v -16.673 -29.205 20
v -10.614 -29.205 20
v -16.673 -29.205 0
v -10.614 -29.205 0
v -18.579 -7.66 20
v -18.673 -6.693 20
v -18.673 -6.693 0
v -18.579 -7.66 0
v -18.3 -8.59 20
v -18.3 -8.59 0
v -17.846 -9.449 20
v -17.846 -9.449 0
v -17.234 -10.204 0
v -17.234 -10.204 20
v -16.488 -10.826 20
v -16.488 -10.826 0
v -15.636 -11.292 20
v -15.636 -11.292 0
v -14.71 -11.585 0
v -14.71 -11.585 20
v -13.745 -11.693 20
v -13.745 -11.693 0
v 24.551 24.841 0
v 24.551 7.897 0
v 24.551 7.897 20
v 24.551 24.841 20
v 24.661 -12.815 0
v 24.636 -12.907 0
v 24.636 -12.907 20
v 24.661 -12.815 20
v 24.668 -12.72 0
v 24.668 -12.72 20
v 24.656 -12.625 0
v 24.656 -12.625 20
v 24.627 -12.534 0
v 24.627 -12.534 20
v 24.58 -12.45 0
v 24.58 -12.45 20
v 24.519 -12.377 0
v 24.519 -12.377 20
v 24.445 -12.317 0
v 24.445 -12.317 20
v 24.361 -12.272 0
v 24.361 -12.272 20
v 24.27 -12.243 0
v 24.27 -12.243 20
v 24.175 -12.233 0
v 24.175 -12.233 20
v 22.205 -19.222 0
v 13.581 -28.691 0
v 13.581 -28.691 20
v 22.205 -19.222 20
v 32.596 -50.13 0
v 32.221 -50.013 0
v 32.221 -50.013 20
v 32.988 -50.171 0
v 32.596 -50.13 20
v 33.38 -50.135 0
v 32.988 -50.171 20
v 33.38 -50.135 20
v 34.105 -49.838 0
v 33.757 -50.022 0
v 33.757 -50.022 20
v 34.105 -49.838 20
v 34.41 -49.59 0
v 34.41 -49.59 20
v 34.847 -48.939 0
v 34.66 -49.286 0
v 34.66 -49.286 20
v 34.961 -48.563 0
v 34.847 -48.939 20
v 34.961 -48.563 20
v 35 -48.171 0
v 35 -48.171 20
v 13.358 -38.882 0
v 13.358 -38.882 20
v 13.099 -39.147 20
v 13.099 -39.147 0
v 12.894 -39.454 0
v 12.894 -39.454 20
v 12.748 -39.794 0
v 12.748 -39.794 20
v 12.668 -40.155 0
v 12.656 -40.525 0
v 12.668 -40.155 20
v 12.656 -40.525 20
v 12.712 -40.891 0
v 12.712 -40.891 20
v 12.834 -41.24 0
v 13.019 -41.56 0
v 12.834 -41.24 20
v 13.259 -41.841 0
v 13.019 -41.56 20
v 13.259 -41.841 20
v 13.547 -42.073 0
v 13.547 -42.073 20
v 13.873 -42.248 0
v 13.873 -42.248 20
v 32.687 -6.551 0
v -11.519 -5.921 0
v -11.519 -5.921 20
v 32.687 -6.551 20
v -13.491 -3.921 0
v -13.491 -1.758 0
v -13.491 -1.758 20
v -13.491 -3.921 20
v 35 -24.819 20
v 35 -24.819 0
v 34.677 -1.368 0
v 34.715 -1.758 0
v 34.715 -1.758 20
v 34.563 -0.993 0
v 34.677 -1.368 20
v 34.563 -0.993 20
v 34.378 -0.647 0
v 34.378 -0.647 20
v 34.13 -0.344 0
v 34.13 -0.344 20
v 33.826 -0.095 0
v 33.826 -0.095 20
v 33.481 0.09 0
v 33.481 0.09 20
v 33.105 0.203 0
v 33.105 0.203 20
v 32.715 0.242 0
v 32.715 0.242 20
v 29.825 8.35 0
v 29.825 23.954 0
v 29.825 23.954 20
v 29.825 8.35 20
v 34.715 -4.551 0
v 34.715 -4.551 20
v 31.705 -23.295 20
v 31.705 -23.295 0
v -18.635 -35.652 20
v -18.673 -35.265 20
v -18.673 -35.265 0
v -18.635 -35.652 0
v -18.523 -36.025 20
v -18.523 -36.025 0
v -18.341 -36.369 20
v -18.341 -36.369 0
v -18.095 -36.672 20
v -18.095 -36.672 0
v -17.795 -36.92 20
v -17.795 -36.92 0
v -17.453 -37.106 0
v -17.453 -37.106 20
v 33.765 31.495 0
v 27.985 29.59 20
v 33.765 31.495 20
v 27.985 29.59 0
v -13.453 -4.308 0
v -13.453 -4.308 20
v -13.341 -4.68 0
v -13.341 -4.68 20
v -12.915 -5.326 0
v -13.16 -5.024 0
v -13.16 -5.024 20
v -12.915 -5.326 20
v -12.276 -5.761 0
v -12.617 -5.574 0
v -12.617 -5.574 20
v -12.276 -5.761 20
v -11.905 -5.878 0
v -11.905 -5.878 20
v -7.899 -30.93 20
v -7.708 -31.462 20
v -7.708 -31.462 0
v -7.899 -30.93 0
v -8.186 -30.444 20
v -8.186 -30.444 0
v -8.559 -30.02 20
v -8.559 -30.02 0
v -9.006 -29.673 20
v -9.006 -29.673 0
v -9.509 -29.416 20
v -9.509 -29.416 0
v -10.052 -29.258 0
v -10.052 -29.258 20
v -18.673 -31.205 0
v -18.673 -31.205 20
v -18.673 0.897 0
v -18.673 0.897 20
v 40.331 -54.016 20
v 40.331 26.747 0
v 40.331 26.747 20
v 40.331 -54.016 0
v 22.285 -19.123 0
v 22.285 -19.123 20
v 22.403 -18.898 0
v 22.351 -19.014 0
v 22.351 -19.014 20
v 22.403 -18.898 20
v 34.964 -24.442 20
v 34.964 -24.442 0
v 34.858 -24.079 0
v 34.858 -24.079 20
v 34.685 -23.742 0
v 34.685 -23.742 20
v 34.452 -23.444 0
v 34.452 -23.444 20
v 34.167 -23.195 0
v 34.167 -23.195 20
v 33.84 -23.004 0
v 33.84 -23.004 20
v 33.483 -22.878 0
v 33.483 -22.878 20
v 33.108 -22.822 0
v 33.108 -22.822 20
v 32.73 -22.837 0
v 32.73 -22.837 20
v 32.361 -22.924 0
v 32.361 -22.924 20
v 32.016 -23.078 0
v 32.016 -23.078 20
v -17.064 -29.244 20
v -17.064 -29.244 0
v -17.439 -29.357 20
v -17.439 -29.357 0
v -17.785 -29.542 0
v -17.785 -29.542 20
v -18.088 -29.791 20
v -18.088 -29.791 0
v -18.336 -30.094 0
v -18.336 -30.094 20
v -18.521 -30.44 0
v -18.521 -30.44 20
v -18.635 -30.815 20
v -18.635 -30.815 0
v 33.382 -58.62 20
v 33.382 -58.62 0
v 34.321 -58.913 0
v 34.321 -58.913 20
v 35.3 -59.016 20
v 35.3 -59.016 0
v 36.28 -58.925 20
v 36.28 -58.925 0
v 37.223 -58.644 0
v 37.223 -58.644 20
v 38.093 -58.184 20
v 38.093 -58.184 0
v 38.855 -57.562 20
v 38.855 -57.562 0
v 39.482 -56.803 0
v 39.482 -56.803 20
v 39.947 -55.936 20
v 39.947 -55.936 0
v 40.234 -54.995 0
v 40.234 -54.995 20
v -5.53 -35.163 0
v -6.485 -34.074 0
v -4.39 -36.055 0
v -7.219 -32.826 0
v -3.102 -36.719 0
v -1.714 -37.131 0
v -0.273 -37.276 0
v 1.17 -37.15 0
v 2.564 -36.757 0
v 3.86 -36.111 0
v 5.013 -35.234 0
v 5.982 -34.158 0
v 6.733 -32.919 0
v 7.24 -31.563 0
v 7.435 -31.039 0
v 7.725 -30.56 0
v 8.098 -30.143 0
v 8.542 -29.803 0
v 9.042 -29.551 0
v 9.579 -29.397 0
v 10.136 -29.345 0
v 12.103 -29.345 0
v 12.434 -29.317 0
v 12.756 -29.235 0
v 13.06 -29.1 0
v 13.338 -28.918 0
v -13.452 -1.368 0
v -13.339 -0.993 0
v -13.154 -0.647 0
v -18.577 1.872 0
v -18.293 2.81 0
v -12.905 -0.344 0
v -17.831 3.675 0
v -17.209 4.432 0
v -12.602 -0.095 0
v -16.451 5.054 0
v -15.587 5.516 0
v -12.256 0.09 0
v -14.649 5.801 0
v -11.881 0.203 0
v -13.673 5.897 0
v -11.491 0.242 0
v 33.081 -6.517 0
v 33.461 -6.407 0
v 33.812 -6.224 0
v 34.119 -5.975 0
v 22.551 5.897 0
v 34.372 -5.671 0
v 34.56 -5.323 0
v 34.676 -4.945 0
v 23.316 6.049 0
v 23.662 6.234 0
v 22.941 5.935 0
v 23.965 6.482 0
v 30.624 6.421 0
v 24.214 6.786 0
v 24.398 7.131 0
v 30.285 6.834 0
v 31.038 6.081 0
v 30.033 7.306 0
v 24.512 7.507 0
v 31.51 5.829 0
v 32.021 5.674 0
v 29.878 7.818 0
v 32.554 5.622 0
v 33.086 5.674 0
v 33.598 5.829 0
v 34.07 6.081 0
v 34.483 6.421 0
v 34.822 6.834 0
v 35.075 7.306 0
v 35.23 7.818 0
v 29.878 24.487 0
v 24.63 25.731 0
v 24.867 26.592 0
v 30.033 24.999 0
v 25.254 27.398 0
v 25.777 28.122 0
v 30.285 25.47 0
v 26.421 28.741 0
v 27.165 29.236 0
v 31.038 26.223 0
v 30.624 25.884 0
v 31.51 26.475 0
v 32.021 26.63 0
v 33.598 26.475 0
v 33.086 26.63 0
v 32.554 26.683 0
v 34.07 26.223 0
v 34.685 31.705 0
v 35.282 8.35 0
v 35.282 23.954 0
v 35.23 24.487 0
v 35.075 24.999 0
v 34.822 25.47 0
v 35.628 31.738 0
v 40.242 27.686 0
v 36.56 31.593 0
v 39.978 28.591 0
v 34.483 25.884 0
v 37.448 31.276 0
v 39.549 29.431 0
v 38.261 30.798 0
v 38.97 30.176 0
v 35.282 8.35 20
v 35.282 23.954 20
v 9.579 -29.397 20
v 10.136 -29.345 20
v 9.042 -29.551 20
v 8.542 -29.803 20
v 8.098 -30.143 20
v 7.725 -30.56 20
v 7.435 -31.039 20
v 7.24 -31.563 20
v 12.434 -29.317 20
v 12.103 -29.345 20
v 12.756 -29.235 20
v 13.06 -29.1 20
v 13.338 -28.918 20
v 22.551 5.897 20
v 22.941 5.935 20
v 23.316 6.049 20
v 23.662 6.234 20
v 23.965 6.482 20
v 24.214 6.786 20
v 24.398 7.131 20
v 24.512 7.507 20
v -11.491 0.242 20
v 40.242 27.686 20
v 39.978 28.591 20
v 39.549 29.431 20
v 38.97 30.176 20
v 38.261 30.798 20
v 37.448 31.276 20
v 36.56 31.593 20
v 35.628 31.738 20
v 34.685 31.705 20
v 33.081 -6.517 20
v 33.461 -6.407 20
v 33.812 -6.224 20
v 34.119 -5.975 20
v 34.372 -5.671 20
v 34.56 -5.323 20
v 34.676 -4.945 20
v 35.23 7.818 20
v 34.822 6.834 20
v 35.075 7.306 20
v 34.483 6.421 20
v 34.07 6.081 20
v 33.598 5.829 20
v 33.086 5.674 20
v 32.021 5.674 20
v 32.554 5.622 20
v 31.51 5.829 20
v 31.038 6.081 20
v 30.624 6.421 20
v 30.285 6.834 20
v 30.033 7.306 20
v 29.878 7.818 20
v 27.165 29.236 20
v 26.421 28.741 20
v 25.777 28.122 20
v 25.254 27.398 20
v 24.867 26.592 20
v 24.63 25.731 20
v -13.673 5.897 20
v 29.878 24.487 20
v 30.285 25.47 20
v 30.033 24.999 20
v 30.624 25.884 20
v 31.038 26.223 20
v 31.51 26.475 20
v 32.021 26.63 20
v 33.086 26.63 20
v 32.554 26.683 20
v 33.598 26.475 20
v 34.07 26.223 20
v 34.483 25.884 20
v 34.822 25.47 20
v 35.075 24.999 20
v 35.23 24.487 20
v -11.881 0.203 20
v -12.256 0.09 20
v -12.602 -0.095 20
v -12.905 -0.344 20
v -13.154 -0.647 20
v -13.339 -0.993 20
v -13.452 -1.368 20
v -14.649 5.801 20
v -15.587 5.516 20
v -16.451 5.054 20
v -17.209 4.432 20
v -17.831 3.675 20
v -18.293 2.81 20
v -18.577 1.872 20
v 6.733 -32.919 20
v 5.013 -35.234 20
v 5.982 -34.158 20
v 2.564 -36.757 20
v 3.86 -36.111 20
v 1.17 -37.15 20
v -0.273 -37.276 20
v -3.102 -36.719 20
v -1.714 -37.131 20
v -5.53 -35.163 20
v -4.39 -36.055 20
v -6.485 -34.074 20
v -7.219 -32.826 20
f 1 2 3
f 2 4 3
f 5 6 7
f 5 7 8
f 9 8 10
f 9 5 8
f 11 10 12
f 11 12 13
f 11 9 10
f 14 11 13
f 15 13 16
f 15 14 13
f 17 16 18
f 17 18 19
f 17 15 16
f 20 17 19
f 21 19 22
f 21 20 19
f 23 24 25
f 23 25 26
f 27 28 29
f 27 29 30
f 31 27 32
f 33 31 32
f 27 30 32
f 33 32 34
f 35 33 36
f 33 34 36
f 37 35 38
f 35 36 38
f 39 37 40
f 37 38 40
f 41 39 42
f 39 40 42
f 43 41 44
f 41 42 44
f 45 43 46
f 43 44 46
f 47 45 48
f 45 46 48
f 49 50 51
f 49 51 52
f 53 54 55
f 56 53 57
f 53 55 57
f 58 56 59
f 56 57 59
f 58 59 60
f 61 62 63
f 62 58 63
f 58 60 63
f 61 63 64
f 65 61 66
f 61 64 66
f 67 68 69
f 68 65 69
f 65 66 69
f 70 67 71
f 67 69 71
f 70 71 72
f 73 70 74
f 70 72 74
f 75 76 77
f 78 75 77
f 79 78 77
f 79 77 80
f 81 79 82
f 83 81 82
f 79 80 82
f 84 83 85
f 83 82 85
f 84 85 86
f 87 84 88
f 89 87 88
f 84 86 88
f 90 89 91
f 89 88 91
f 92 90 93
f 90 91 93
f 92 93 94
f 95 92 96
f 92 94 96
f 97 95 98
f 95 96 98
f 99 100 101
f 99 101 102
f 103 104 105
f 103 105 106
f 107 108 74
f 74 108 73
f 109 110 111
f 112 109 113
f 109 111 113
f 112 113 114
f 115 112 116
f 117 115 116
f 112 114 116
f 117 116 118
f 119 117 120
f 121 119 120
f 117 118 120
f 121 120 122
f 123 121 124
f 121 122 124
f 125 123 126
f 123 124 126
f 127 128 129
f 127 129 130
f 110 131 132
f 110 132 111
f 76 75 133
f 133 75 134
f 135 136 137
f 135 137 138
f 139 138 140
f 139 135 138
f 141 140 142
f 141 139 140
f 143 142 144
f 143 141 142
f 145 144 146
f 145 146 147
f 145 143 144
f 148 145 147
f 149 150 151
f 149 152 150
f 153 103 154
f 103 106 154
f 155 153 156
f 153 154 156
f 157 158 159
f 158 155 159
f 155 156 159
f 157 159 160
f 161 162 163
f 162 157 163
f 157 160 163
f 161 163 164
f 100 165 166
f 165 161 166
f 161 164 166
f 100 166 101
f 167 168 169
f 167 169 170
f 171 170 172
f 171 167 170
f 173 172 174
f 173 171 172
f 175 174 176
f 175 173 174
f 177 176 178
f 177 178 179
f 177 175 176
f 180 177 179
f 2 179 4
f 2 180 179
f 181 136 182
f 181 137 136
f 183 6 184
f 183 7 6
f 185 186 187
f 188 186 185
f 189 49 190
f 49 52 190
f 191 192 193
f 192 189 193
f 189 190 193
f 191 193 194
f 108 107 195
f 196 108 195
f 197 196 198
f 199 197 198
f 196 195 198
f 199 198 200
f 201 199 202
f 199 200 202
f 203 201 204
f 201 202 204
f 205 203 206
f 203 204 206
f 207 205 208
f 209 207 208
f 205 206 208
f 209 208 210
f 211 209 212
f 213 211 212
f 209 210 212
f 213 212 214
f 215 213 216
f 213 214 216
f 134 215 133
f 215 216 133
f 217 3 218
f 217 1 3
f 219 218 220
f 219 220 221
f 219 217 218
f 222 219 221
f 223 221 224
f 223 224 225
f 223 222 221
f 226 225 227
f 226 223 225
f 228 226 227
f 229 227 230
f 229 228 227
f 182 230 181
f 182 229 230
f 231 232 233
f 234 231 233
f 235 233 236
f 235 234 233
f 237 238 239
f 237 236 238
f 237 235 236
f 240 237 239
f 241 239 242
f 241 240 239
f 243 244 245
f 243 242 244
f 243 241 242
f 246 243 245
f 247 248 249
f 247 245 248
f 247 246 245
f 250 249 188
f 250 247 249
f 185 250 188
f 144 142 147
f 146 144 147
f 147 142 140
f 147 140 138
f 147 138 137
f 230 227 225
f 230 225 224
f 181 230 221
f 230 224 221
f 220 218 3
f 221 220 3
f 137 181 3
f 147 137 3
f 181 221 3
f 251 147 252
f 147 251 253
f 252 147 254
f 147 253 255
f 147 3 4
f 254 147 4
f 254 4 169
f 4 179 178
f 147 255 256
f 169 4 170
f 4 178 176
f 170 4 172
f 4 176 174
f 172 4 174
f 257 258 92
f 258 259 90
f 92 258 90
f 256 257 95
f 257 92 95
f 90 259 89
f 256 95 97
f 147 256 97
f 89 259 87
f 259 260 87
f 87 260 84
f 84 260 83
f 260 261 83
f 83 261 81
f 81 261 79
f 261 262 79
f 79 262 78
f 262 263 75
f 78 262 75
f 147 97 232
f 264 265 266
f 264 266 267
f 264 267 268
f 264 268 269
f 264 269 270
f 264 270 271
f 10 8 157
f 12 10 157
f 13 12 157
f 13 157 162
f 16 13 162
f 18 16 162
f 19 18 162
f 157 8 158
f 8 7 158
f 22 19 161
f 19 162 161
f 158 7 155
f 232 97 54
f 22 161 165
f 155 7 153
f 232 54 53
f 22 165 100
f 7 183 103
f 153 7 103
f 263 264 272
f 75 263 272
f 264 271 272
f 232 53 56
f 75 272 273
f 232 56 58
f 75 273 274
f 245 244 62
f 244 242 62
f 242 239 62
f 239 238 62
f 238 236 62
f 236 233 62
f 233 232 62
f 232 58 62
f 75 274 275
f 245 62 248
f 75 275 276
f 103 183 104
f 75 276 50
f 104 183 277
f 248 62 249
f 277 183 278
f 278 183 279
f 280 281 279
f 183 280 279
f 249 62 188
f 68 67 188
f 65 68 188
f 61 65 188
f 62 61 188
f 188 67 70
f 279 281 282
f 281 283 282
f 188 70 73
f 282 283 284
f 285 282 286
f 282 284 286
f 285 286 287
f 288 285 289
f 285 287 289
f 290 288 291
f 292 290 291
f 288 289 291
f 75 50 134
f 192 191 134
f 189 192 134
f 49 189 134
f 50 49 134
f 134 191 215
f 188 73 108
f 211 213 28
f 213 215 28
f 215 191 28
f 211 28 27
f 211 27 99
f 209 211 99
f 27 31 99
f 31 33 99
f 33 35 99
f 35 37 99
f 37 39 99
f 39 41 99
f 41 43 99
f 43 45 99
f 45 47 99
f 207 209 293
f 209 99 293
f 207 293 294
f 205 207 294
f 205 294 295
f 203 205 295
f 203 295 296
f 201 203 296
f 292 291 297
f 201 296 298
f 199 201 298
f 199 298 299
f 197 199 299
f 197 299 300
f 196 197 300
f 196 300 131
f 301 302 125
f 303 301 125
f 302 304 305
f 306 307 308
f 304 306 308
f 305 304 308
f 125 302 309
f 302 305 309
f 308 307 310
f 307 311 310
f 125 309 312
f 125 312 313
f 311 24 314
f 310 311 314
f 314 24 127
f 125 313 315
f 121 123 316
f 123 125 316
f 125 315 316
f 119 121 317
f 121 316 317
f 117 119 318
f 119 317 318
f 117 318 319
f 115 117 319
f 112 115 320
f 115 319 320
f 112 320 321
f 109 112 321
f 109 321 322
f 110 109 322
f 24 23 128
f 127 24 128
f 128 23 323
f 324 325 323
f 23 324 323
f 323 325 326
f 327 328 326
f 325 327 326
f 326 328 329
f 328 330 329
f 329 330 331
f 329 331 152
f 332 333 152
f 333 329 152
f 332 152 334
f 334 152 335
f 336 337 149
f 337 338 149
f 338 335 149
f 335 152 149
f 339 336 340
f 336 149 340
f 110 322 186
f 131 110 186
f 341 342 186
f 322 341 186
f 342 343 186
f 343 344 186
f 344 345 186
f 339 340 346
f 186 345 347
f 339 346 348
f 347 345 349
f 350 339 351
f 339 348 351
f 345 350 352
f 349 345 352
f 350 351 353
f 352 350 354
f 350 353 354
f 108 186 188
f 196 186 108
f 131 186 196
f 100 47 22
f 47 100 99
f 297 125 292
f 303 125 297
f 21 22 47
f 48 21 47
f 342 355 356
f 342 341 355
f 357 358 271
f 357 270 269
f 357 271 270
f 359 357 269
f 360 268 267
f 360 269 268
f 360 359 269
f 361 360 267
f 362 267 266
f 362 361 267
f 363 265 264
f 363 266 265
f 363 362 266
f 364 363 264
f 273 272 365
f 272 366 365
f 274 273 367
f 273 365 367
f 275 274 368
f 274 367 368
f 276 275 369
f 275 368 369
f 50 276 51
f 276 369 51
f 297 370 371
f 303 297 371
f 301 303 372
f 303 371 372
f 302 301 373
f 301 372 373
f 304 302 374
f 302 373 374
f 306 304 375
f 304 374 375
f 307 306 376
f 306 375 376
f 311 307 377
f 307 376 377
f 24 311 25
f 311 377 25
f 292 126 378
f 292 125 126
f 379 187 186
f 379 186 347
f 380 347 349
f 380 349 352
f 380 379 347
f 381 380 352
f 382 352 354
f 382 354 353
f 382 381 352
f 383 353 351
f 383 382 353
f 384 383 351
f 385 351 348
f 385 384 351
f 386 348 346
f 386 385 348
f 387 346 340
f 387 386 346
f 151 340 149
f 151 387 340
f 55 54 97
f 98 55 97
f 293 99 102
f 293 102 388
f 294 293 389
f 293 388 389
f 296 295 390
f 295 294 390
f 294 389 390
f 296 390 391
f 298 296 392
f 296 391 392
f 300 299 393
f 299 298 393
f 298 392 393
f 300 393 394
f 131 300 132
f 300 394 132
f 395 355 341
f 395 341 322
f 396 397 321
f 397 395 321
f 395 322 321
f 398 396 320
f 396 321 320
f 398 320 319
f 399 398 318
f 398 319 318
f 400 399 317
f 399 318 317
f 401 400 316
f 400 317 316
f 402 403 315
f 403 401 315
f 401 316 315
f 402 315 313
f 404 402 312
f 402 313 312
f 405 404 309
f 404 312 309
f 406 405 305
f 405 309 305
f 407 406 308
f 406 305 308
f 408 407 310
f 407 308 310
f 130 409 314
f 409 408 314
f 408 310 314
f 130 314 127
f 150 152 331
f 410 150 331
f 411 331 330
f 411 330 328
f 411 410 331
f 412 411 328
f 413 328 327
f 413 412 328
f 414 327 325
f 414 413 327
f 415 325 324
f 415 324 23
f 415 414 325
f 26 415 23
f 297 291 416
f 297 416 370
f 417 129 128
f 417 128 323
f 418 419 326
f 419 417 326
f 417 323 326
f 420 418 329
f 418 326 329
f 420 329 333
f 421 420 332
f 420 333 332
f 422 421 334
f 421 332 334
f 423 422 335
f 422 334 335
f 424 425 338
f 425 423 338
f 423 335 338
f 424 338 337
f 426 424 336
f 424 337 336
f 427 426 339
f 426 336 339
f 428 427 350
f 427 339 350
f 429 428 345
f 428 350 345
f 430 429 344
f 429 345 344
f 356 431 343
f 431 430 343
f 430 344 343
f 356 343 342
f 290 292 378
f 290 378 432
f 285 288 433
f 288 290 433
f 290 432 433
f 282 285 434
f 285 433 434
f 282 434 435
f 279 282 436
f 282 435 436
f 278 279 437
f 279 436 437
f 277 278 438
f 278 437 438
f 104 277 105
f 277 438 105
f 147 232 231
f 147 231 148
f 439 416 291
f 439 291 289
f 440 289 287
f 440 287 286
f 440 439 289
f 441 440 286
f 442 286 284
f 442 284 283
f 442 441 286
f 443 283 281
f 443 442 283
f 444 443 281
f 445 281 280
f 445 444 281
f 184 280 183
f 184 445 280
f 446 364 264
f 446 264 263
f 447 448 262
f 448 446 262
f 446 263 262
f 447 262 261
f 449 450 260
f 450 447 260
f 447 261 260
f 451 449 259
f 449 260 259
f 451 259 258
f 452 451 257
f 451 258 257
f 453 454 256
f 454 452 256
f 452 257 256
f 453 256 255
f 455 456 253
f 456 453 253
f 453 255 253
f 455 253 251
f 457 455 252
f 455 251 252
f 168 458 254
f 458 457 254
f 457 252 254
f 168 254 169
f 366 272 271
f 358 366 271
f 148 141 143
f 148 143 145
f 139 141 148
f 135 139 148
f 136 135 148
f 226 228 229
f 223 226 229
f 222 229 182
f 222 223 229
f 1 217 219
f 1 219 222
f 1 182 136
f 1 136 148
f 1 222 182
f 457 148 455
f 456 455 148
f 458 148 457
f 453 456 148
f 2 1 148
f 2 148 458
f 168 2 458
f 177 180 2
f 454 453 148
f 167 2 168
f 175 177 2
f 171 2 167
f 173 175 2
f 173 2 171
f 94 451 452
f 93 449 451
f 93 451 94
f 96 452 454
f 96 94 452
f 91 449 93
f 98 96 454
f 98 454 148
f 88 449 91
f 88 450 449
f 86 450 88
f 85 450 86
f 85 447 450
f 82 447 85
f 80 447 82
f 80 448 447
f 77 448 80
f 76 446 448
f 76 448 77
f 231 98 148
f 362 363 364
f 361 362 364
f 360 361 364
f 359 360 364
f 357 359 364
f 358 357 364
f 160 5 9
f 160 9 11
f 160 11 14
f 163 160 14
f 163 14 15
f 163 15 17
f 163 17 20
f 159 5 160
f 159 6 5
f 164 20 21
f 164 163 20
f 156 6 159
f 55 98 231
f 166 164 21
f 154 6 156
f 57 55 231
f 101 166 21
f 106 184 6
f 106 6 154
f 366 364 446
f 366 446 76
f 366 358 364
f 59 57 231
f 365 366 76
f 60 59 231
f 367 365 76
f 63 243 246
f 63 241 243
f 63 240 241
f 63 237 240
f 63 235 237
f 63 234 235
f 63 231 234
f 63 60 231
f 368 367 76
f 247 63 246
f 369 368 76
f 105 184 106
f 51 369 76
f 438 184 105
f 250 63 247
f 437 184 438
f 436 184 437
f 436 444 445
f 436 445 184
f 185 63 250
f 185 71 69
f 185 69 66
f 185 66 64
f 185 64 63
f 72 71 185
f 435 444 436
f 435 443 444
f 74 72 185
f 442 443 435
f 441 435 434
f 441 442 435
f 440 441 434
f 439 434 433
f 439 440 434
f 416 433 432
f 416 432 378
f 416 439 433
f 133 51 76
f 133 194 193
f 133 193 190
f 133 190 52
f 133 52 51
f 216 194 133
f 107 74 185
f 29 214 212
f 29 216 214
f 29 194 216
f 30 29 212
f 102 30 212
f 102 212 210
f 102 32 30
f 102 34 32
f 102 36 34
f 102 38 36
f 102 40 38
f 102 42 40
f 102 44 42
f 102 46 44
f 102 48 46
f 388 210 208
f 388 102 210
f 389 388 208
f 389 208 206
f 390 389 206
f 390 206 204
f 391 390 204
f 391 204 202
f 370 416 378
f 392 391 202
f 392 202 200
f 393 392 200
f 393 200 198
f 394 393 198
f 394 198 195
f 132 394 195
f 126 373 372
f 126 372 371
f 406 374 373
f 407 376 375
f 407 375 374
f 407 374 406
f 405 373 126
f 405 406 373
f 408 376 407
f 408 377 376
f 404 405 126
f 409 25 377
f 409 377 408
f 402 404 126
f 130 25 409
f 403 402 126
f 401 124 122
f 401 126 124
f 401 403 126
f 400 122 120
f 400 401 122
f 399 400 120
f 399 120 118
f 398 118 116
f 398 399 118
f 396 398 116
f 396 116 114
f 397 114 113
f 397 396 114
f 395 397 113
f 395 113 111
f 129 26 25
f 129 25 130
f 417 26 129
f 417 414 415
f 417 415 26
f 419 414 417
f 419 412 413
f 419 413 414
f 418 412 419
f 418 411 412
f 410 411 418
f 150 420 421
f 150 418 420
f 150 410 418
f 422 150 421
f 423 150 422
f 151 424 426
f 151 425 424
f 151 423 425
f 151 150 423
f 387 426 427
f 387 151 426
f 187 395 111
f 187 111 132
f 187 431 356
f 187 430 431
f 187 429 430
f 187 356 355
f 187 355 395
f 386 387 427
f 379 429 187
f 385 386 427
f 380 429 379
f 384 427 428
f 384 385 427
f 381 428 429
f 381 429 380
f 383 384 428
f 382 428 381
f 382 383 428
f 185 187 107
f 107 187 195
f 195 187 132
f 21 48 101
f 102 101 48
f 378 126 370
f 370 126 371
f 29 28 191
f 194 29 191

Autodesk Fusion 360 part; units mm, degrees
sketch "草图1" plane through (0, 0, 0) normal (0, 0, 1) x (1, 0, 0) in component "support"
  line L0 (40.3306, 33.6594) -> (40.3306, -61.561)
  line L1 (40.3306, -61.561) -> (-18.6734, -36.5899)
  line L2 (-18.6734, -36.5899) -> (-18.6734, 5.8967)
  line L3 (-18.6734, 5.8967) -> (24.5506, 5.8967)
  line L4 (24.5506, 5.8967) -> (24.5506, 28.4577)
  line L5 (24.5506, 28.4577) -> (40.3306, 33.6594)
  line L6 (35.2823, 8.3501) -> (35.2823, 23.9544)
  arc A0 (35.2823, 23.9544) -> (29.8253, 23.9544) centre (32.5538, 23.9544) ccw
  line L7 (29.8253, 23.9544) -> (29.8253, 8.3501)
  arc A1 (29.8253, 8.3501) -> (35.2823, 8.3501) centre (32.5538, 8.3501) ccw
  line L8 (32.5538, 5.6216) -> (32.5538, 26.6829) construction
  line L9 (-13.4908, -5.8932) -> (34.7153, -6.5796)
  line L10 (34.7153, -6.5796) -> (34.7153, 0.2419)
  line L11 (-18.6734, -11.6226) -> (24.884, -12.2428)
  line L12 (24.884, -12.2428) -> (22.3355, -19.0792)
  line L13 (-7.9409, -29.2052) -> (-18.6734, -29.2052)
  line L14 (35, -20.4957) -> (35, -51.1893)
  line L15 (-13.4908, 0.2419) -> (-13.4908, -5.8932)
  line L16 (34.7153, 0.2419) -> (-13.4908, 0.2419)
  line L17 (35, -51.1893) -> (10.8843, -40.9833)
  line L18 (10.8843, -40.9833) -> (35, -20.4957)
  line L19 (12.9862, -29.3446) -> (22.3355, -19.0792)
  line L20 (12.9862, -29.3446) -> (7.5042, -29.3446)
  arc A2 (-7.9409, -29.2052) -> (7.5042, -29.3446) centre (-0.2208, -29.5486) ccw
extrude "拉伸4" add sketch "草图1" along normal blind 20 contours L0 L1 L2 L3 L4 L5 L11 L12 L13 L19 L20 A2 in component "support"
fillet "圆角22" radius 2 1 edges at (10.8843, -40.9833, 10) in component "support"
fillet "圆角23" radius 2 1 edges at (35, -51.1893, 10) in component "support"
fillet "圆角24" radius 2 1 edges at (35, -20.4957, 10) in component "support"
fillet "圆角25" radius 5 1 edges at (40.3306, -61.561, 10) in component "support"
fillet "圆角26" radius 5 1 edges at (40.3306, 33.6594, 10) in component "support"
fillet "圆角27" radius 5 1 edges at (24.5506, 28.4577, 10) in component "support"
fillet "圆角28" radius 2 1 edges at (24.5506, 5.8967, 10) in component "support"
fillet "圆角29" radius 5 2 edges at (-18.6734, 5.8967, 10) (-18.6734, -11.6226, 10) in component "support"
fillet "圆角30" radius 2 1 edges at (-18.6734, -29.2052, 10) in component "support"
fillet "圆角31" radius 2 1 edges at (-18.6734, -36.5899, 10) in component "support"
fillet "圆角32" radius 2 1 edges at (34.7153, 0.2419, 10) in component "support"
fillet "圆角33" radius 2 1 edges at (34.7153, -6.5796, 10) in component "support"
fillet "圆角34" radius 2 1 edges at (-13.4908, -5.8932, 10) in component "support"
fillet "圆角35" radius 2 1 edges at (-13.4908, 0.2419, 10) in component "support"
fillet "圆角36" radius 0.5 1 edges at (24.884, -12.2428, 10) in component "support"
fillet "圆角37" radius 1 1 edges at (22.3355, -19.0792, 10) in component "support"
fillet "圆角38" radius 2 1 edges at (12.9862, -29.3446, 10) in component "support"
fillet "圆角39" radius 3 1 edges at (-7.9409, -29.2052, 10) in component "support"
fillet "圆角40" radius 3 1 edges at (7.5042, -29.3446, 10) in component "support"
component "support" placed x (1, 0, 0) y (0, 1, 0) z (0, 0, 1) at (0, 0, 0)
